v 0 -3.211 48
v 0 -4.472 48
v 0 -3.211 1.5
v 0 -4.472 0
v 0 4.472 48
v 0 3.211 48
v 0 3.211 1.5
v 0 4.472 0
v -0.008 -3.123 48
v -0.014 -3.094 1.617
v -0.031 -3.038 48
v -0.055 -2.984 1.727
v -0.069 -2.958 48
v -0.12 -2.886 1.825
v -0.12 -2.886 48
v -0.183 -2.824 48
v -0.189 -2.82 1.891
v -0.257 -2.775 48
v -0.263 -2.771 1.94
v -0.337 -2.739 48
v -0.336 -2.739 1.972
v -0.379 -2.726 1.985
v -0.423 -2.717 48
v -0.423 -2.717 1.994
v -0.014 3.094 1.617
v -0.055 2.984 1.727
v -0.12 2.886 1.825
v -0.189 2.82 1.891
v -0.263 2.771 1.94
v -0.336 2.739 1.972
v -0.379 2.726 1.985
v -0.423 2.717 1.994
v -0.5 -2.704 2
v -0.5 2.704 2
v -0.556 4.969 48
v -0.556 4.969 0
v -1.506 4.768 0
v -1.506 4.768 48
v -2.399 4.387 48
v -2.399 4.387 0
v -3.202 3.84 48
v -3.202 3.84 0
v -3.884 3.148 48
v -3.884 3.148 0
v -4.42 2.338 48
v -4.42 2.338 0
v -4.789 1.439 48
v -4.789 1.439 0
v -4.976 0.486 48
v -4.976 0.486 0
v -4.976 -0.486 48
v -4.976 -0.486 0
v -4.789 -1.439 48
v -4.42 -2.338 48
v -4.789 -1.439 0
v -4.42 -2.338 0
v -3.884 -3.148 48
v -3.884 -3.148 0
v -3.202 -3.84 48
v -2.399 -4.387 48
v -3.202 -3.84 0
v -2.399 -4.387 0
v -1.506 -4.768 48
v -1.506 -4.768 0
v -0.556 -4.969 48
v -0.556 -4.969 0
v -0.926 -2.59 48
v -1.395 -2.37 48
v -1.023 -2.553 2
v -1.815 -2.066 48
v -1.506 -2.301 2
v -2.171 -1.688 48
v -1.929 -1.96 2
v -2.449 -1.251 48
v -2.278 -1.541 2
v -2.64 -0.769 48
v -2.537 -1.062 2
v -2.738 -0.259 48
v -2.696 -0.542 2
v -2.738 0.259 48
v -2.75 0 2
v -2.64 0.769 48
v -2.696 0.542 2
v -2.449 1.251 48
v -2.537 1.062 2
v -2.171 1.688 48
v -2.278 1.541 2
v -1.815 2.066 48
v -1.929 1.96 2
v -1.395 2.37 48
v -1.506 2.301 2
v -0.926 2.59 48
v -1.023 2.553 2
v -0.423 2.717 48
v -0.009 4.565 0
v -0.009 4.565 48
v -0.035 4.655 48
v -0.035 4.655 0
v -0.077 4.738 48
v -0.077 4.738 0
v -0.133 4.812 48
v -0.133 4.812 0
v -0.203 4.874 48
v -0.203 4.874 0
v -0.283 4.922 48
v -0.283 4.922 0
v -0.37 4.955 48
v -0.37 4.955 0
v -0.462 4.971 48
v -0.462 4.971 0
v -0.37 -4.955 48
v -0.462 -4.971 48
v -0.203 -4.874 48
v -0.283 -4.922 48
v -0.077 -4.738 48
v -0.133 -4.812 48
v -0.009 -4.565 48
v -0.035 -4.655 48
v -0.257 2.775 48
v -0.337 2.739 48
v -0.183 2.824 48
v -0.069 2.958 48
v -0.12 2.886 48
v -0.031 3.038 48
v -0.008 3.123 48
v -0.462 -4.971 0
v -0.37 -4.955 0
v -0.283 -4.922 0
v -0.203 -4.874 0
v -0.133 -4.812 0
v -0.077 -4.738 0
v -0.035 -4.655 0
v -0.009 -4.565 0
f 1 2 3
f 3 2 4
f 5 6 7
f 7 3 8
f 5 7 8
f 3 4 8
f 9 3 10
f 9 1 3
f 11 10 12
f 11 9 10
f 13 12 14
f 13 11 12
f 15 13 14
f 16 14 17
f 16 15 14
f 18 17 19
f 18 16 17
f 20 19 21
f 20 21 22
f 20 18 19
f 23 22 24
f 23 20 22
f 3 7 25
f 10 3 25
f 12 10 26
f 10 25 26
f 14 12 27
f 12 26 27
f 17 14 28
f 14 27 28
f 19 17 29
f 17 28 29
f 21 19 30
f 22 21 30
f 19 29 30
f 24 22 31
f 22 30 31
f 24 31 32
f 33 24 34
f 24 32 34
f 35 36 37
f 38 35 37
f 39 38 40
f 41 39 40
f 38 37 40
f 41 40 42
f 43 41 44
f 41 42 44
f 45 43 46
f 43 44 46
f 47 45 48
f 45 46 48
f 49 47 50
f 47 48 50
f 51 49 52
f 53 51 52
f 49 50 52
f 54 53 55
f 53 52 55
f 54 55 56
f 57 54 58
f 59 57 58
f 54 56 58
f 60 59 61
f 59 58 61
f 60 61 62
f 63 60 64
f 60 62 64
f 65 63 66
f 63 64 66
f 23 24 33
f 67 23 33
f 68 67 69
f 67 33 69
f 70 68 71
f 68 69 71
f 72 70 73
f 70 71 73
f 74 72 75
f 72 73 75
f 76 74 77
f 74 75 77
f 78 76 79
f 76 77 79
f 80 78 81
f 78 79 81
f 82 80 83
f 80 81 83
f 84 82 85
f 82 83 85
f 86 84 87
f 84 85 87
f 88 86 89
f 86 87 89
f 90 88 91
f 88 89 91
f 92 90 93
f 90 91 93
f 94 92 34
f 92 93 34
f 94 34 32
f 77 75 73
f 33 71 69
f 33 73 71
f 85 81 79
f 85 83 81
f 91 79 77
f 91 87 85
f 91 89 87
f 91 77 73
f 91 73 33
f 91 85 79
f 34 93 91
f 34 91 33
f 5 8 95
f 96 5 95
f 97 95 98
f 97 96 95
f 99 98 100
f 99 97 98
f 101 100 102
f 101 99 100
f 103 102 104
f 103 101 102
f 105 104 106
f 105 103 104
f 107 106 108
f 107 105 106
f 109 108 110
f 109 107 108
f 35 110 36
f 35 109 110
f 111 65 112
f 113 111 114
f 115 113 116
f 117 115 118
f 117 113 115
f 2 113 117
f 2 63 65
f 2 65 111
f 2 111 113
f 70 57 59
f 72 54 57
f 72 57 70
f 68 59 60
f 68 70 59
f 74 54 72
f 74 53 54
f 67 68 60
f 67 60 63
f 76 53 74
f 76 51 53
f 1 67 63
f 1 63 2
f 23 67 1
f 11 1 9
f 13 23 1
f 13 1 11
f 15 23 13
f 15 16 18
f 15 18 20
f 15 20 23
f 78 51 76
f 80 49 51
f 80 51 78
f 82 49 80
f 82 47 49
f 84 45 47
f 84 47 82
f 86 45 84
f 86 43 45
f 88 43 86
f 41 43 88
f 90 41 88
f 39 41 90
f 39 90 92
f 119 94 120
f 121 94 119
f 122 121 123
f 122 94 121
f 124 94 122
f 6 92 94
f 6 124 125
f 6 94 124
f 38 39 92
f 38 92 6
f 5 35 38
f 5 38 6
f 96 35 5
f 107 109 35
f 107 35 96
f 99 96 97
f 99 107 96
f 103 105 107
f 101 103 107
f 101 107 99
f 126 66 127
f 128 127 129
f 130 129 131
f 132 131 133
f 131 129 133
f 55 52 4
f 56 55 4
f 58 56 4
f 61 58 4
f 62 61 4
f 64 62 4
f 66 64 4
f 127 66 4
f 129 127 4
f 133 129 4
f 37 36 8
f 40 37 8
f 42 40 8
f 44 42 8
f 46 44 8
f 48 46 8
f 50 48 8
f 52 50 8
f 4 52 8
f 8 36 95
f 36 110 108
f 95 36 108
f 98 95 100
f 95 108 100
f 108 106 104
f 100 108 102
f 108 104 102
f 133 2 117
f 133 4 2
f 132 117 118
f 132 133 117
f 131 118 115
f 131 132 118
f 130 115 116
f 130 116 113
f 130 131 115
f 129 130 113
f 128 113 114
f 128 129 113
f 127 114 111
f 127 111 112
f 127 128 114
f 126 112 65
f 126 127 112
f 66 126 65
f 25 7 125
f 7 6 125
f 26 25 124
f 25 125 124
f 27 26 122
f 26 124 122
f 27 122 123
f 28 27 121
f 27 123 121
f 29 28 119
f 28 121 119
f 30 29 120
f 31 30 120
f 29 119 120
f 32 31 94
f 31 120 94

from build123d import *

# Parameters (mm, degrees)
F1_DEPTH = 48
F2_DEPTH = 2
F3_R     = 0.5


with BuildPart() as f1:
    # F0 (on Top) → F1 (new body)
    with BuildSketch(Plane.XY):
        with BuildLine():
            Line((0, 2.75), (0, 5))
            ThreePointArc((0, 5), (-5, 0), (0, -5))
            Line((0, -5), (0, -2.75))
            ThreePointArc((0, -2.75), (-2.75, 0), (0, 2.75))
        make_face()
    extrude(amount=F1_DEPTH)

    # F0 (on Top) → F2 (join)
    with BuildSketch(Plane.XY):
        with BuildLine():
            Line((0, 2.75), (0, 5))
            ThreePointArc((0, 5), (-5, 0), (0, -5))
            Line((0, -5), (0, -2.75))
            ThreePointArc((0, -2.75), (-2.75, 0), (0, 2.75))
        make_face()
        with BuildLine():
            Line((0, -2.75), (0, 2.75))
            ThreePointArc((0, 2.75), (-2.75, 0), (0, -2.75))
        make_face()
    extrude(amount=F2_DEPTH)

    # F3
    f3_edges = [f1.edges().sort_by_distance(p)[0] for p in [
        (0, 2.75, 25),
        (0, -2.75, 25),
        (0, -5, 24),
        (0, 0, 2),
        (0, 5, 24),
    ]]
    fillet(f3_edges, radius=F3_R)


solid = f1.part
